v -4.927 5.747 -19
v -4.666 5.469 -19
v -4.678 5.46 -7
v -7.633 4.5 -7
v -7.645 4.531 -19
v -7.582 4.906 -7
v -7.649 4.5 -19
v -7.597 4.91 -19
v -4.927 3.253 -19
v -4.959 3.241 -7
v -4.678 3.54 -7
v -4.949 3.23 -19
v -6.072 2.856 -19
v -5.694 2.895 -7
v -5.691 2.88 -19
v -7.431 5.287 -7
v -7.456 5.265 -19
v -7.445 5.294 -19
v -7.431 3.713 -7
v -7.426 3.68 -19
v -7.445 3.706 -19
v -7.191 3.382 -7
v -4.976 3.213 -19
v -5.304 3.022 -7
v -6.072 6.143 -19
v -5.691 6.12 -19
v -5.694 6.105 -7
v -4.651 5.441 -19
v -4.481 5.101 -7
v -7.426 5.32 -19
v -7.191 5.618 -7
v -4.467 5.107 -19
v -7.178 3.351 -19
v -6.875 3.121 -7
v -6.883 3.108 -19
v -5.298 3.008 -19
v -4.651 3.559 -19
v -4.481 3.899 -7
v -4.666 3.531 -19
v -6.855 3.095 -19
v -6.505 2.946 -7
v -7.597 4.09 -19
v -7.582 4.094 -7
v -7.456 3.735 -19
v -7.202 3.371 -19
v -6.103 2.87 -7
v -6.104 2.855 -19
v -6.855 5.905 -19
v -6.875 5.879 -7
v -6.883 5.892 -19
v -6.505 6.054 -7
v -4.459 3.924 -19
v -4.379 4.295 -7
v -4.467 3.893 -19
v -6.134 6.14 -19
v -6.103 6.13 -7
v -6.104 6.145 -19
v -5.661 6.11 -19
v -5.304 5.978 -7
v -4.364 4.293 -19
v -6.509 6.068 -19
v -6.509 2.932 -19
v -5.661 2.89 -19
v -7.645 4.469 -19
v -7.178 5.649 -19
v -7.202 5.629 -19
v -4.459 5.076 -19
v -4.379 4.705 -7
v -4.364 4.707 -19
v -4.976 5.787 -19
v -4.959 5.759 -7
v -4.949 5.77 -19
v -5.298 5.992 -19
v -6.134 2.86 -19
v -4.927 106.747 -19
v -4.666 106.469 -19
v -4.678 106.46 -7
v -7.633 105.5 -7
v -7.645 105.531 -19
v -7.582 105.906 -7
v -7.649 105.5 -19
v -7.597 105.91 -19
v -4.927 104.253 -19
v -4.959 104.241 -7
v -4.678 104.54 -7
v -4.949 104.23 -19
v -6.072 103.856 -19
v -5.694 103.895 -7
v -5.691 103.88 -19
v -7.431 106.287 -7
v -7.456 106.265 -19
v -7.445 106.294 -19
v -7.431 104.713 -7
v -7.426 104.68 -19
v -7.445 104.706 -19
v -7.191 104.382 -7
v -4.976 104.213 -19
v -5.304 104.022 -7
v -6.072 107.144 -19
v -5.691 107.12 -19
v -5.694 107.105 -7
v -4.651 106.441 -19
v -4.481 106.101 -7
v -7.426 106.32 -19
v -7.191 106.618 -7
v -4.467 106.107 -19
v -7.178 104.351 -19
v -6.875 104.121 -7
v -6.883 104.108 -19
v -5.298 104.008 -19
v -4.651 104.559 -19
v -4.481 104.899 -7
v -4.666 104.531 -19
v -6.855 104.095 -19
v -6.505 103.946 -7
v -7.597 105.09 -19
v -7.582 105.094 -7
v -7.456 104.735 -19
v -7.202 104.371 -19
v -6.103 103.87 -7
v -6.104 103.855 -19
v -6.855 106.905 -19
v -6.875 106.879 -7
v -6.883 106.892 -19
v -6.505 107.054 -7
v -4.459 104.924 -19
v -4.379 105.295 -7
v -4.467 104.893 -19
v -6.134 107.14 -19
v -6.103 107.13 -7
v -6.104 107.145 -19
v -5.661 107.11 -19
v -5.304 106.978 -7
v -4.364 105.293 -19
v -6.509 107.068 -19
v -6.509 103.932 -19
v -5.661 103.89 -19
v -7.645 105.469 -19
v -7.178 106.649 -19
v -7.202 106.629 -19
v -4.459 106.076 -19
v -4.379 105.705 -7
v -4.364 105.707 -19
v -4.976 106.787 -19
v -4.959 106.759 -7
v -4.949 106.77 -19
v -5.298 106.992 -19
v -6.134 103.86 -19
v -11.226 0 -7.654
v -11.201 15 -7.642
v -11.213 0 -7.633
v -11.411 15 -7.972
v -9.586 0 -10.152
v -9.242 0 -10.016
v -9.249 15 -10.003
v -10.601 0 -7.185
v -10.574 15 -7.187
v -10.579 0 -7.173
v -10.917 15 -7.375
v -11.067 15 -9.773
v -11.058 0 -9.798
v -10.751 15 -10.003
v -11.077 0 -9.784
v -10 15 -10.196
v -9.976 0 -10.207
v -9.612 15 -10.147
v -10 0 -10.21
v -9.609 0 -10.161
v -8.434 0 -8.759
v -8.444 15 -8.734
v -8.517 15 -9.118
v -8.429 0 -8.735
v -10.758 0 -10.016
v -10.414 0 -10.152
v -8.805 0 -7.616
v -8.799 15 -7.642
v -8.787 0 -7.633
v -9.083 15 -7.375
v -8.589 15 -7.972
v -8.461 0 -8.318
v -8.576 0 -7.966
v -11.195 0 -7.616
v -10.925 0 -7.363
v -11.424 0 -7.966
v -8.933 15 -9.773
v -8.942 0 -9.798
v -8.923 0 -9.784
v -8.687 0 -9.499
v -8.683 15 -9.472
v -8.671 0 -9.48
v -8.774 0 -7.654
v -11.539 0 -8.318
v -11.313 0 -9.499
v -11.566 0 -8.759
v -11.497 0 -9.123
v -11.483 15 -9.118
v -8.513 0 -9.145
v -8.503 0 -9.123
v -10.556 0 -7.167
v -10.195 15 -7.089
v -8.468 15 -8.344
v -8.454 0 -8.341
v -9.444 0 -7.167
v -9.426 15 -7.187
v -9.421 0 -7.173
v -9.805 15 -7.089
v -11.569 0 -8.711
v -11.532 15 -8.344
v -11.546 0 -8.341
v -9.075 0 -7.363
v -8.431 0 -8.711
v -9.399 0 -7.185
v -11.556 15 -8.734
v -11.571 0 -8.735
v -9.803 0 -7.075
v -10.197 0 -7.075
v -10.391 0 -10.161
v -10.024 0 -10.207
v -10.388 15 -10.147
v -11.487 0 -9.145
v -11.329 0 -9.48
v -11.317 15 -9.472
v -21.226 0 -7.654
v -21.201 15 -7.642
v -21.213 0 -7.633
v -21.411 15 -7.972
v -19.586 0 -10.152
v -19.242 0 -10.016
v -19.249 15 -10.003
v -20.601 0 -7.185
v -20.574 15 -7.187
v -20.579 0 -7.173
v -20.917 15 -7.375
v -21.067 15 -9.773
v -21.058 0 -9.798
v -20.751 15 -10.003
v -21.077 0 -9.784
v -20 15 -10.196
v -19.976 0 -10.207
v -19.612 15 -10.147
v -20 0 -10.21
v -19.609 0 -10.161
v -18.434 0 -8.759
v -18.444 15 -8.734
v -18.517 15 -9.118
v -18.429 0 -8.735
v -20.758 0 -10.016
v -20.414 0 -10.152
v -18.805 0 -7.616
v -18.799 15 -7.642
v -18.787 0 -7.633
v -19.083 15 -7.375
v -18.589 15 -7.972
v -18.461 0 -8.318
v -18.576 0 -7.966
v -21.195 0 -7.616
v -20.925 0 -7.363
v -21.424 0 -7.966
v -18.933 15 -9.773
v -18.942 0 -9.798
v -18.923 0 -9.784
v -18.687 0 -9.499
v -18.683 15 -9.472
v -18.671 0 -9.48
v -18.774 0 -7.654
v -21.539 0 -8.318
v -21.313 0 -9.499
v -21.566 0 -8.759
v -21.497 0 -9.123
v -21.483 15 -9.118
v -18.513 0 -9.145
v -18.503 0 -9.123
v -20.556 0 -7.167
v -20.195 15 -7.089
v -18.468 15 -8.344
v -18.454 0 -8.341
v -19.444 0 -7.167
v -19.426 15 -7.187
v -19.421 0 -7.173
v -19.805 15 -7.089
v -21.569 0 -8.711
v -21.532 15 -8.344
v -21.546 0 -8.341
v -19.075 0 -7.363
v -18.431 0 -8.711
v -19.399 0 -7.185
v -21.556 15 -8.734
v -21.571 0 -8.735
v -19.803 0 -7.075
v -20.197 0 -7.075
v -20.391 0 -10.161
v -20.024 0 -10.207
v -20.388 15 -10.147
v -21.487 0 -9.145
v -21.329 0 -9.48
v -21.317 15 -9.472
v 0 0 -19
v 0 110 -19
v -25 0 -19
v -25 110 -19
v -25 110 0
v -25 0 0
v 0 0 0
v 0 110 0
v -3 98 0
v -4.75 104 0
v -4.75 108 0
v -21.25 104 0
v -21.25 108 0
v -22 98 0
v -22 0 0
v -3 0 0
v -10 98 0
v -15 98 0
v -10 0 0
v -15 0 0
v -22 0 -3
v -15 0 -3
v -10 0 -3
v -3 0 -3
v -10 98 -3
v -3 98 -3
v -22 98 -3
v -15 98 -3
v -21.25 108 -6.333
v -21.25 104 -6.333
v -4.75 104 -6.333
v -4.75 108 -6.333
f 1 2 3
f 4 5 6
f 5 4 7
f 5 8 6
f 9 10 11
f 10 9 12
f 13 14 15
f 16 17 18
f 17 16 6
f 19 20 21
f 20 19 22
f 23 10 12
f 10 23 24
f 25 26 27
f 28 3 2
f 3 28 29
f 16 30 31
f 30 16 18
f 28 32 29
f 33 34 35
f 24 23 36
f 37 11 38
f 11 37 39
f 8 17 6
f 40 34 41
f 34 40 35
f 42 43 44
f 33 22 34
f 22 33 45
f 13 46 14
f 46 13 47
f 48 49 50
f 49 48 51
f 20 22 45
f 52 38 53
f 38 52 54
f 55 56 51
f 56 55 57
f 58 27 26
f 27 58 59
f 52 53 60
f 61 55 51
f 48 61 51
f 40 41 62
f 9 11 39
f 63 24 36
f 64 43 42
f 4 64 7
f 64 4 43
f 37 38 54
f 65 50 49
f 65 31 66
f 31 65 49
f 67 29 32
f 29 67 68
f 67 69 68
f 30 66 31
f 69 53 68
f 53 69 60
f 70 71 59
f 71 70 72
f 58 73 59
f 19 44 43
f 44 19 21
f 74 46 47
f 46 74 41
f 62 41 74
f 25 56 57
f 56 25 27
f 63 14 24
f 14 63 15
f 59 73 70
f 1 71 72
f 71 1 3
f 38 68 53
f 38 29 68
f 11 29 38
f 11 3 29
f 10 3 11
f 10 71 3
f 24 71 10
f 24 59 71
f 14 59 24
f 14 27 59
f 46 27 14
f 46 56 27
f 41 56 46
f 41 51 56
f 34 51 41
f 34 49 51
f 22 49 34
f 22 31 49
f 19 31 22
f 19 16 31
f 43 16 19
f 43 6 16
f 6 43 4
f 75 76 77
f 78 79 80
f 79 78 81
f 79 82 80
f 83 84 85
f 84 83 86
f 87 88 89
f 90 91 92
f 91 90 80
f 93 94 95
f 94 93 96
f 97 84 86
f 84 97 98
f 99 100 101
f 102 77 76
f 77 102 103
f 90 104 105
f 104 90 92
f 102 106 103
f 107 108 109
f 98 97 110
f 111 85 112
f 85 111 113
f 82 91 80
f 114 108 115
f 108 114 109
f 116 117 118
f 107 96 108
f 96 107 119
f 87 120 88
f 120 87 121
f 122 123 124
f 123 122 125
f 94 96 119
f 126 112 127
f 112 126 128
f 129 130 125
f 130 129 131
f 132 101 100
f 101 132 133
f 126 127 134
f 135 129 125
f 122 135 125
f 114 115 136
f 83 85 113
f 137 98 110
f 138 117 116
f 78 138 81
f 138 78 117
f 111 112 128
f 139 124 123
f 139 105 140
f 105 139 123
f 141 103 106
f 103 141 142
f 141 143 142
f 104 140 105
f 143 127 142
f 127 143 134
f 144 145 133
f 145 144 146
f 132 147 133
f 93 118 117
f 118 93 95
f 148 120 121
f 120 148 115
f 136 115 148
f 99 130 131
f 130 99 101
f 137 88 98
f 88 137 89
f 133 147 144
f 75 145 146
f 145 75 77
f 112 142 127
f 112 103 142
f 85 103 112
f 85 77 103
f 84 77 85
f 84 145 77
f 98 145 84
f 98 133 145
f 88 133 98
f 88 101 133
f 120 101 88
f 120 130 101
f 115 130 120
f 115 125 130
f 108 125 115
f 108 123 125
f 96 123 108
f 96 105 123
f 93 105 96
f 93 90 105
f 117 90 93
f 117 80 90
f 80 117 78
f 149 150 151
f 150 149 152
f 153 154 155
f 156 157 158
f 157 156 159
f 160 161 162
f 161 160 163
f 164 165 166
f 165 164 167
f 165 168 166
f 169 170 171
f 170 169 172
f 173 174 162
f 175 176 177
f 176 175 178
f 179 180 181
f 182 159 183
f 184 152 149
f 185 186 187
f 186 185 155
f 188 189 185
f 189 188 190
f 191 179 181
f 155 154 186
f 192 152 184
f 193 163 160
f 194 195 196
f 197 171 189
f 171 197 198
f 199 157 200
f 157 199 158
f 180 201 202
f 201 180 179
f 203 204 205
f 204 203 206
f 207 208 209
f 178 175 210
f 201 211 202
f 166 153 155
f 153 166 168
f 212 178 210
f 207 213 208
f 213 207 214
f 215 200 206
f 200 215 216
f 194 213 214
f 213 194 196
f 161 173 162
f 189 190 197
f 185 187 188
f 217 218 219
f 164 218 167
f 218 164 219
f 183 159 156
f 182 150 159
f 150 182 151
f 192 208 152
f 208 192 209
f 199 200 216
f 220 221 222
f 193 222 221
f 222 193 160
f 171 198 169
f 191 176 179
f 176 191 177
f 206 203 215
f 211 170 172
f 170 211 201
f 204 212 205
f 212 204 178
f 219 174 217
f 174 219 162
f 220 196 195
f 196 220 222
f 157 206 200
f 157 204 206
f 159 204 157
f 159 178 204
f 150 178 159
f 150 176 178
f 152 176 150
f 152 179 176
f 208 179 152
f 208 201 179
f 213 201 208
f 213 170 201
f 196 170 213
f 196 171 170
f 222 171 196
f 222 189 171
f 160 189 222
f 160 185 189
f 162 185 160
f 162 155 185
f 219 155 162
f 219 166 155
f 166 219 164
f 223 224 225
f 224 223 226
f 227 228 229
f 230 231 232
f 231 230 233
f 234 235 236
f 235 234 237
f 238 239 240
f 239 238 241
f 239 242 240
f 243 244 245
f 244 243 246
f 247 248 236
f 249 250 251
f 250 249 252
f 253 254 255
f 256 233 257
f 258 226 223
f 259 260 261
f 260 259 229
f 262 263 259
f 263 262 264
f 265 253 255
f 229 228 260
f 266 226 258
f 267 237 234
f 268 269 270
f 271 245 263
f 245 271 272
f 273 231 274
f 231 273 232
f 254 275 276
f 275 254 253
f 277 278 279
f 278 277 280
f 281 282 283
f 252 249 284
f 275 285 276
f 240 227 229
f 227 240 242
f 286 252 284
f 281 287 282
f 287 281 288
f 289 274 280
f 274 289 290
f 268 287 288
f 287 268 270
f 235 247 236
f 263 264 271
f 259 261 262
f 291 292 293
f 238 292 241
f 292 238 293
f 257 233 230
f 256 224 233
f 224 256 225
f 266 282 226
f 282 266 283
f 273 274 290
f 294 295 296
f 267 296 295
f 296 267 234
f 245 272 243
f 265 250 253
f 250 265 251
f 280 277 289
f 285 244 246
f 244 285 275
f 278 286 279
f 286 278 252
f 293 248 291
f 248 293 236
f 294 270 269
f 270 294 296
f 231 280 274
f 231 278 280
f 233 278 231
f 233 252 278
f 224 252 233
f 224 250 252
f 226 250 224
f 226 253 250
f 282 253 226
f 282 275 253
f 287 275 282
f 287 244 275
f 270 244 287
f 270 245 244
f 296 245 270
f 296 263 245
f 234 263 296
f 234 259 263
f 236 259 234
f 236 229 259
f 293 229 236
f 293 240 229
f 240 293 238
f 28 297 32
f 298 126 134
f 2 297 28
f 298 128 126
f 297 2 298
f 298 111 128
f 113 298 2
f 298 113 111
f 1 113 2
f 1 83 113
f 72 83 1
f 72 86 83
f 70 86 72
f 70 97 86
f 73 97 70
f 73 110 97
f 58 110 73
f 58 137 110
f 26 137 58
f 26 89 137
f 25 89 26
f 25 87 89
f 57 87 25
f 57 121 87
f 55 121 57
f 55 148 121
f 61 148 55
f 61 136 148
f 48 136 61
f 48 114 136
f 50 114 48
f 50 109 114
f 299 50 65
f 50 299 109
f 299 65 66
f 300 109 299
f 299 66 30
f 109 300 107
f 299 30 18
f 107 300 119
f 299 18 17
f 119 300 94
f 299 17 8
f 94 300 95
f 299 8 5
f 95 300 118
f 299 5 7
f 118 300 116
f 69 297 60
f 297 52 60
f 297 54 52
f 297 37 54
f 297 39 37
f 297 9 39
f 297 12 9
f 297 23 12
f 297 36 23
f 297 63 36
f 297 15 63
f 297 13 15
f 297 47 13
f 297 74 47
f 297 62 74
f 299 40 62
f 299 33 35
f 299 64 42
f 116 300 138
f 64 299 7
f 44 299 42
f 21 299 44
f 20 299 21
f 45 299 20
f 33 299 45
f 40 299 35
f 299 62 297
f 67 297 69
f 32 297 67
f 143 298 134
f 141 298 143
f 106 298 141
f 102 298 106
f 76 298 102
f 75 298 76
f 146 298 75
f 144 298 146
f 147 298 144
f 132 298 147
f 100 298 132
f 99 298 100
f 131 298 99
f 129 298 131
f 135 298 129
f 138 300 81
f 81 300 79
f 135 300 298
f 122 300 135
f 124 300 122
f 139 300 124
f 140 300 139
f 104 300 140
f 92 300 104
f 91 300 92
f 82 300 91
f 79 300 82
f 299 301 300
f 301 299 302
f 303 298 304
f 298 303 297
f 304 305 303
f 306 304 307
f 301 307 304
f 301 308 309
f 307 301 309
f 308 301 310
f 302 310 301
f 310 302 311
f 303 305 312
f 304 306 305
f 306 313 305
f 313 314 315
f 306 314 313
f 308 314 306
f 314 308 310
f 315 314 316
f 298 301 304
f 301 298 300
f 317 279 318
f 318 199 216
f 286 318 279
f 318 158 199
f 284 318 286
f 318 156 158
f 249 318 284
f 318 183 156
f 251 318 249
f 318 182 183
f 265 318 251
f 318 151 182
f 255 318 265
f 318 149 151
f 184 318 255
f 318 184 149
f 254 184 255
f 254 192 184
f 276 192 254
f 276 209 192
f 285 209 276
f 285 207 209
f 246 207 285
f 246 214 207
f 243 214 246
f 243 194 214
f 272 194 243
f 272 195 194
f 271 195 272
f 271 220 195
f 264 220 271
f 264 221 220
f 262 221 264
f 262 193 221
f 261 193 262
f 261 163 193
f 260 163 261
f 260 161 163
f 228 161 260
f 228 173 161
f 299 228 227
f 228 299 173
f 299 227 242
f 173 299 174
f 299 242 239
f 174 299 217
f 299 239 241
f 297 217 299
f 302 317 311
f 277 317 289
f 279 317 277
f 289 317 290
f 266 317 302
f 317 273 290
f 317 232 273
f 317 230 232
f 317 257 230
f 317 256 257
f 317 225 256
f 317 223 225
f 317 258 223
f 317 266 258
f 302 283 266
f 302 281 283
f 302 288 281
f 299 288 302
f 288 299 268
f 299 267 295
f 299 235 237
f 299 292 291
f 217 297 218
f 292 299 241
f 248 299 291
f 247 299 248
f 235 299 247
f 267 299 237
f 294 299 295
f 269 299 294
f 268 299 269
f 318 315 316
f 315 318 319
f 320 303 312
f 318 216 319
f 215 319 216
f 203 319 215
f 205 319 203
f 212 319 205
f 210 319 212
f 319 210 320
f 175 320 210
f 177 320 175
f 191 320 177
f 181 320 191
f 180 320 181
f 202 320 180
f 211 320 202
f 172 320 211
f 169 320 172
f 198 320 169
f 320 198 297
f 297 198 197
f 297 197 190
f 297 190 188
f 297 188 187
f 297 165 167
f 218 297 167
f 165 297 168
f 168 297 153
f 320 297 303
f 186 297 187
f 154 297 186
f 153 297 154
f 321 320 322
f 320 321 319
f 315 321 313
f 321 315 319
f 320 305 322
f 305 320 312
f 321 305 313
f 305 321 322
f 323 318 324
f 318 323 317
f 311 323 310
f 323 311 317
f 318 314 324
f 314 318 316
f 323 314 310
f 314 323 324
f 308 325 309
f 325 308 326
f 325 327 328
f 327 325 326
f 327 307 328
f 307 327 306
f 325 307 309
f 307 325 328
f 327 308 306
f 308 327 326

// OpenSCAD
/*
    Parametric Dual M.2 / SSD to 3.5" Adapter
        * You need to export one bracket per side
    
    Source: https://github.com/KaiserSoft/3D-Printing/tree/master/Dual%20M2%20%20or%202.5%20SSD%20Mounting%20Adapter
    
    License: CC0 1.0 Universal (CC0 1.0) Public Domain Dedication
    Designed: 2019 by Mirko Kaiser in Stuttgart, Germany
*/

/* [User Config Options] */
// You need one bracket for each side
Bracket = "left"; // [ left, right, stabilizer, lockplate ]

// Thickness of the PCB or SSD
Slot1_Height = 7; // [ 1.25:1.25mm Bare PCB, 2:2mm Bare PCB, 5:5mm, 6:6mm, 7:7mm, 8:8mm, 9:9mm, 10:10mm, 11:11mm ]
// Length of PCB or SSD - WARNING: mSATA will not mix with other settings!
Slot1_Length = 98; // [ 48:48 mSATA PCB, 98:98mm M.2 PCB, 101:101mm SSD ]
// Adjust the depth if your PCB has components close to the edge. WARNING setting this below 3mm will change the width of the part and the depth of the other slot to ensure that the total width stays within 3.5"
Slot1_Depth = 3; // [ 1:1mm, 2:2mm, 3:3mm, 4:4mm ]

// Thickness of the PCB or SSD - WARNING: mSATA will not mix with other settings!
Slot2_Height = 7; // [ 1.25:1.25mm Bare PCB, 2:2mm Bare PCB, 5:5mm, 6:6mm, 7:7mm, 8:8mm, 9:9mm, 10:10mm, 11:11mm ]
// Length of PCB or SSD
Slot2_Length = 98; // [ 48:48 mSATA PCB, 98:98mm M.2 PCB, 101:101mm SSD ]
// Adjust the depth if your PCB has components close to the edge. WARNING setting this below 3mm will change the width of the part and the depth of the other slot to ensure that the total width stays within 3.5"
Slot2_Depth = 3; // [ 1:1mm, 2:2mm, 3:3mm, 4:4mm ]
// Ad mounting holes for the locking plate
Lock_Plate = 1; // [0:no, 1:yes]
// Add stabilizing plate slot
Stabilizer_Slot = 1; // [0:no, 1:yes]
// Width of the mSATA PCB
mSATAPCB_Width = 57.5; // [ 43:0.5:70 ]

/* [Bracket Dimensions] */
BracketLength = 110;
BracketHeight = 25;
BracketWidth = 19;
// width of a 3.5" slot
TotalWidth = 101;

/* [3.5" Mounting Holes] */
MountingHolesDiameter = 3.3;
MountingHolesDepth = 12;
MountingHolesDistance = 101;
MountingHolesDistanceBottom = 6;
// in percent
MountingHolesTaper = 1;

/* [Sliding Lock] */
LockHolesDiameter = 3.15;
LockHolesDepth = 15;
LockHolesDistance = 10;
LockHolesSlotLength = 3.5; // + LockHolesDiameter
// in percent
LockHolesTaper = 1;
LockThickness = 1; //in mm
LockCornersDiameter = 3; // in mm


// Adjust Width of block for low PCB clearance
Shallow = ( Slot1_Depth < Slot2_Depth ) ? Slot1_Depth : Slot2_Depth;
BracketWidthUsed = ( Slot1_Depth < 3 || Slot2_Depth < 3 )? BracketWidth - (3 - Shallow) : BracketWidth;
Slot1DepthUsed = ( Slot1_Depth < 3 ) ? Slot1_Depth : Slot1_Depth + (3 - Shallow) ;
Slot2DepthUsed = ( Slot2_Depth < 3 ) ? Slot2_Depth : Slot2_Depth + (3 - Shallow);
if( Slot1_Depth < 3 || Slot2_Depth < 3 && Slot1_Depth != Slot2_Depth ){
    echo("WARNING: slot depth below 3mm and not equal depth!");
}

//Adjust Width for mSATA slots
mSATAWidthModifier = (TotalWidth - mSATAPCB_Width - BracketWidthUsed*2)/2 + Shallow;
BracketWidthUsedmSATA = ( Slot1_Length == 48 || Slot2_Length == 48 ) ? BracketWidthUsed + mSATAWidthModifier : BracketWidthUsed;
/* variables end */





/* create bodies */
if( Bracket == "left" ) {
    mirror( [1, 0 ,0] ){ 
        difference(){
            if ( Slot1_Length == 48 || Slot2_Length == 48 ){
                mountingBlock(BracketWidthUsedmSATA);
            }else{
                mountingBlock(BracketWidthUsed);
            }
            if( Stabilizer_Slot == 1 ){
                makeStabilizerSlot( BracketWidth-2.5, 4, MountingHolesDistance-(BracketWidth- BracketWidth/3)*2);
            }
        }
    }
    
}else if( Bracket == "right" ) {
    difference(){
        if ( Slot1_Length == 48 || Slot2_Length == 48 ){
            mountingBlock(BracketWidthUsedmSATA);
        }else{
            mountingBlock(BracketWidthUsed);
        }
        if( Stabilizer_Slot == 1 ){
            makeStabilizerSlot(BracketWidth-2.5, 4, MountingHolesDistance-(BracketWidth-BracketWidth/3)*2);
        }
    }
    
}else if( Bracket == "stabilizer" ){
    rotate([ 90, 0, 180])
    makeStabilizer(BracketWidth-2.5-0.2, 4-0.2, MountingHolesDistance-(BracketWidth-BracketWidth/3)*2 - 0.4);
    
}else if( Bracket == "lockplate" ){
    rotate( [ 90, 0, 0 ]){ //final rotation for proper print orientation
    difference(){
        sliderBody();
            screwSlot( 4, BracketHeight/2 + LockHolesDistance-2.5 );
            screwSlot( 4, BracketHeight/2 - LockHolesDistance+LockHolesDistance-2.5 );
        }
    }
}



/* create Stabilizer slot cut out in block */
module makeStabilizerSlot(sWidth, sThick, sLenght){
    if ( Slot1_Length == 48 || Slot2_Length == 48 ){
        translate([ BracketWidth/4, BracketLength-6, (-BracketWidth/3)-mSATAWidthModifier]){
                makeStabilizer(sWidth, sThick, sLenght);
            }
    }else{
        translate([ BracketWidth/4, BracketLength-6, -BracketWidth/3]){
                makeStabilizer(sWidth, sThick, sLenght);
            }
    }
}

/* make Stabilizer bar for cut out and for printing */
module makeStabilizer( sWidth, sThick, sLenght ){
    color ("green") cube([ sWidth, sThick, sLenght ]);
}

/* the entire mounting block */
module mountingBlock( bWidth ){
    rotate( [0, 90, 0 ] ){ //proper rotation for printing
        difference(){
            /* main Bracket */
            cube( [ bWidth, BracketLength, BracketHeight] , false);


            /* bottom slot */
            if( Slot1_Height < 10 ){
                makeSlot( 3, Slot1_Height, Slot1DepthUsed, Slot1_Length );
            }else if( Slot1_Height == 10 ){
                makeSlot( 2, Slot1_Height, Slot1DepthUsed, Slot1_Length );
            }else{
                makeSlot( 1, Slot1_Height, Slot1DepthUsed, Slot1_Length );
            }


            /* top slot */
            if( Slot2_Height < 5 ){
                distance = BracketHeight-7-3;
                makeSlot( distance, Slot2_Height, Slot2DepthUsed, Slot2_Length );
            }else if( Slot2_Height < 10 ){
                distance = BracketHeight-Slot2_Height-3;
                makeSlot( distance, Slot2_Height, Slot2DepthUsed, Slot2_Length );
            }else if( Slot2_Height == 10 ){
                distance = BracketHeight-Slot2_Height-2;
                makeSlot( distance, Slot2_Height, Slot2DepthUsed, Slot2_Length );
            }else{
                distance = BracketHeight-Slot2_Height-1;
                makeSlot( distance, Slot2_Height, Slot2DepthUsed, Slot2_Length );
            }
            

            /* 3.5" mounting holes */
            m3Holes( bWidth );

            /* lock slider mounting holes */
           if( Lock_Plate == 1 ){
            lockSlider();
           }
        }
    }
}



/* lock slider mount */
module lockSlider(){
    for( x=[0:1] ){
       translate([ BracketWidthUsed/2.2, -1, LockHolesDistance + LockHolesDistance * x]) { 
            rotate( [-90, 0, 0] ){
        color ("red") cylinder( $fn=25, 1+LockHolesDepth, d1=LockHolesDiameter, d2=LockHolesDiameter-LockHolesDiameter*(LockHolesTaper/100),false);
            }
        }
    }
}


/* 3.5" mounting holes */
module m3Holes( bWidth ){
    for( x=[0:1] ){
        translate( [bWidth+1,((BracketLength-MountingHolesDistance)/2)+(x*MountingHolesDistance),MountingHolesDistanceBottom]){
            rotate( [0, -90, 0] ){
                color ("blue") cylinder($fn=25, 1+MountingHolesDepth, d1=MountingHolesDiameter, d2=MountingHolesDiameter-MountingHolesDiameter*(MountingHolesTaper/100),false);
            }
        }
    }
}


/* creates a single slot */
module makeSlot( Distance2Bottom, SlotHeight, SlotDepth, SlotLength ){
    translate([ -1, -1, Distance2Bottom]) {
        color ("purple") cube( [ 1+SlotDepth, 1+SlotLength, SlotHeight], false);
    }
}


/* modules for lock plate below */
module sliderBody(){
    Corner = LockCornersDiameter/2;
    hull(){
        translate( [ Corner, 0, Corner ] ){
            rotate( [-90, 0, 0] ){
                color ("green") makeBodyCylinder();
            }
        }
        translate( [ BracketWidth/1.5-Corner, 0, Corner ] ){
            rotate( [-90, 0, 0] ){
                color ("blue") makeBodyCylinder();
            }
        }
        translate( [ Corner, 0, BracketHeight-Corner ] ){
            rotate( [-90, 0, 0] ){
                color ("red") makeBodyCylinder();
            }
        }
        translate( [ BracketWidth/1.5-Corner, 0, BracketHeight-Corner ] ){
            rotate( [-90, 0, 0] ){
                color ("purple") makeBodyCylinder();
            }
        }
    }
}


module makeBodyCylinder(){
    cylinder( $fn=25, LockThickness, d1=LockCornersDiameter, d2=LockCornersDiameter,false);
}

module screwSlot( x, y ){
    translate( [ 0, 0, y ]){
        union(){
            screwHole( x );
            screwHole( x+LockHolesSlotLength );
            screwBlock( x );
        }
    }
}


module screwHole( x ){
    translate( [ x, -1,0 ] ){
        rotate( [-90, 0, 0] ){
            color ("violet") cylinder( $fn=25, 1+LockHolesDepth, d1=LockHolesDiameter, d2=LockHolesDiameter-LockHolesDiameter*(LockHolesTaper/100),false);
            }
        }
}

module screwBlock( x ){
    translate( [x ,-1, LockHolesDiameter/2]){
        rotate( [0, 90, 0] ){
        color("black") 

            cube( [LockHolesDiameter, 1+LockHolesDepth, LockHolesSlotLength ], false);
        }
    }
}
